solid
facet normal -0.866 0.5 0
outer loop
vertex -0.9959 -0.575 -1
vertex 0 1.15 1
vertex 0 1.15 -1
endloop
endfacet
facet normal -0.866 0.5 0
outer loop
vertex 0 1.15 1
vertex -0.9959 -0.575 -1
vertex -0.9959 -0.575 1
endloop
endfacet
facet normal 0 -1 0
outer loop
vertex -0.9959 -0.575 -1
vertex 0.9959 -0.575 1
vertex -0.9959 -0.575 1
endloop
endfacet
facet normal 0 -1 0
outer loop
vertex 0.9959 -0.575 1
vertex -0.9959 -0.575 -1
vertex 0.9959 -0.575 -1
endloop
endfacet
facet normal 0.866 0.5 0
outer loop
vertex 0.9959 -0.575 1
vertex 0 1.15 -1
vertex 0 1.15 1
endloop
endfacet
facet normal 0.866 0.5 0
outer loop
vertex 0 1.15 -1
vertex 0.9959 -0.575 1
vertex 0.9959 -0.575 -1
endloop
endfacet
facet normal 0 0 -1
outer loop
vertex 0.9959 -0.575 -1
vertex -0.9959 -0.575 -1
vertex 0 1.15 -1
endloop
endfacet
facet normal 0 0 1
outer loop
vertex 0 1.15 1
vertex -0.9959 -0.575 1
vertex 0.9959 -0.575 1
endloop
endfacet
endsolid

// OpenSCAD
translate([0.0,0.0,0.0]){
	rotate([0,0,90.0]){
		cylinder($fn = 3, h = 2.0, r1 = 1.15, r2 = 1.15, center = true);
	}
}
